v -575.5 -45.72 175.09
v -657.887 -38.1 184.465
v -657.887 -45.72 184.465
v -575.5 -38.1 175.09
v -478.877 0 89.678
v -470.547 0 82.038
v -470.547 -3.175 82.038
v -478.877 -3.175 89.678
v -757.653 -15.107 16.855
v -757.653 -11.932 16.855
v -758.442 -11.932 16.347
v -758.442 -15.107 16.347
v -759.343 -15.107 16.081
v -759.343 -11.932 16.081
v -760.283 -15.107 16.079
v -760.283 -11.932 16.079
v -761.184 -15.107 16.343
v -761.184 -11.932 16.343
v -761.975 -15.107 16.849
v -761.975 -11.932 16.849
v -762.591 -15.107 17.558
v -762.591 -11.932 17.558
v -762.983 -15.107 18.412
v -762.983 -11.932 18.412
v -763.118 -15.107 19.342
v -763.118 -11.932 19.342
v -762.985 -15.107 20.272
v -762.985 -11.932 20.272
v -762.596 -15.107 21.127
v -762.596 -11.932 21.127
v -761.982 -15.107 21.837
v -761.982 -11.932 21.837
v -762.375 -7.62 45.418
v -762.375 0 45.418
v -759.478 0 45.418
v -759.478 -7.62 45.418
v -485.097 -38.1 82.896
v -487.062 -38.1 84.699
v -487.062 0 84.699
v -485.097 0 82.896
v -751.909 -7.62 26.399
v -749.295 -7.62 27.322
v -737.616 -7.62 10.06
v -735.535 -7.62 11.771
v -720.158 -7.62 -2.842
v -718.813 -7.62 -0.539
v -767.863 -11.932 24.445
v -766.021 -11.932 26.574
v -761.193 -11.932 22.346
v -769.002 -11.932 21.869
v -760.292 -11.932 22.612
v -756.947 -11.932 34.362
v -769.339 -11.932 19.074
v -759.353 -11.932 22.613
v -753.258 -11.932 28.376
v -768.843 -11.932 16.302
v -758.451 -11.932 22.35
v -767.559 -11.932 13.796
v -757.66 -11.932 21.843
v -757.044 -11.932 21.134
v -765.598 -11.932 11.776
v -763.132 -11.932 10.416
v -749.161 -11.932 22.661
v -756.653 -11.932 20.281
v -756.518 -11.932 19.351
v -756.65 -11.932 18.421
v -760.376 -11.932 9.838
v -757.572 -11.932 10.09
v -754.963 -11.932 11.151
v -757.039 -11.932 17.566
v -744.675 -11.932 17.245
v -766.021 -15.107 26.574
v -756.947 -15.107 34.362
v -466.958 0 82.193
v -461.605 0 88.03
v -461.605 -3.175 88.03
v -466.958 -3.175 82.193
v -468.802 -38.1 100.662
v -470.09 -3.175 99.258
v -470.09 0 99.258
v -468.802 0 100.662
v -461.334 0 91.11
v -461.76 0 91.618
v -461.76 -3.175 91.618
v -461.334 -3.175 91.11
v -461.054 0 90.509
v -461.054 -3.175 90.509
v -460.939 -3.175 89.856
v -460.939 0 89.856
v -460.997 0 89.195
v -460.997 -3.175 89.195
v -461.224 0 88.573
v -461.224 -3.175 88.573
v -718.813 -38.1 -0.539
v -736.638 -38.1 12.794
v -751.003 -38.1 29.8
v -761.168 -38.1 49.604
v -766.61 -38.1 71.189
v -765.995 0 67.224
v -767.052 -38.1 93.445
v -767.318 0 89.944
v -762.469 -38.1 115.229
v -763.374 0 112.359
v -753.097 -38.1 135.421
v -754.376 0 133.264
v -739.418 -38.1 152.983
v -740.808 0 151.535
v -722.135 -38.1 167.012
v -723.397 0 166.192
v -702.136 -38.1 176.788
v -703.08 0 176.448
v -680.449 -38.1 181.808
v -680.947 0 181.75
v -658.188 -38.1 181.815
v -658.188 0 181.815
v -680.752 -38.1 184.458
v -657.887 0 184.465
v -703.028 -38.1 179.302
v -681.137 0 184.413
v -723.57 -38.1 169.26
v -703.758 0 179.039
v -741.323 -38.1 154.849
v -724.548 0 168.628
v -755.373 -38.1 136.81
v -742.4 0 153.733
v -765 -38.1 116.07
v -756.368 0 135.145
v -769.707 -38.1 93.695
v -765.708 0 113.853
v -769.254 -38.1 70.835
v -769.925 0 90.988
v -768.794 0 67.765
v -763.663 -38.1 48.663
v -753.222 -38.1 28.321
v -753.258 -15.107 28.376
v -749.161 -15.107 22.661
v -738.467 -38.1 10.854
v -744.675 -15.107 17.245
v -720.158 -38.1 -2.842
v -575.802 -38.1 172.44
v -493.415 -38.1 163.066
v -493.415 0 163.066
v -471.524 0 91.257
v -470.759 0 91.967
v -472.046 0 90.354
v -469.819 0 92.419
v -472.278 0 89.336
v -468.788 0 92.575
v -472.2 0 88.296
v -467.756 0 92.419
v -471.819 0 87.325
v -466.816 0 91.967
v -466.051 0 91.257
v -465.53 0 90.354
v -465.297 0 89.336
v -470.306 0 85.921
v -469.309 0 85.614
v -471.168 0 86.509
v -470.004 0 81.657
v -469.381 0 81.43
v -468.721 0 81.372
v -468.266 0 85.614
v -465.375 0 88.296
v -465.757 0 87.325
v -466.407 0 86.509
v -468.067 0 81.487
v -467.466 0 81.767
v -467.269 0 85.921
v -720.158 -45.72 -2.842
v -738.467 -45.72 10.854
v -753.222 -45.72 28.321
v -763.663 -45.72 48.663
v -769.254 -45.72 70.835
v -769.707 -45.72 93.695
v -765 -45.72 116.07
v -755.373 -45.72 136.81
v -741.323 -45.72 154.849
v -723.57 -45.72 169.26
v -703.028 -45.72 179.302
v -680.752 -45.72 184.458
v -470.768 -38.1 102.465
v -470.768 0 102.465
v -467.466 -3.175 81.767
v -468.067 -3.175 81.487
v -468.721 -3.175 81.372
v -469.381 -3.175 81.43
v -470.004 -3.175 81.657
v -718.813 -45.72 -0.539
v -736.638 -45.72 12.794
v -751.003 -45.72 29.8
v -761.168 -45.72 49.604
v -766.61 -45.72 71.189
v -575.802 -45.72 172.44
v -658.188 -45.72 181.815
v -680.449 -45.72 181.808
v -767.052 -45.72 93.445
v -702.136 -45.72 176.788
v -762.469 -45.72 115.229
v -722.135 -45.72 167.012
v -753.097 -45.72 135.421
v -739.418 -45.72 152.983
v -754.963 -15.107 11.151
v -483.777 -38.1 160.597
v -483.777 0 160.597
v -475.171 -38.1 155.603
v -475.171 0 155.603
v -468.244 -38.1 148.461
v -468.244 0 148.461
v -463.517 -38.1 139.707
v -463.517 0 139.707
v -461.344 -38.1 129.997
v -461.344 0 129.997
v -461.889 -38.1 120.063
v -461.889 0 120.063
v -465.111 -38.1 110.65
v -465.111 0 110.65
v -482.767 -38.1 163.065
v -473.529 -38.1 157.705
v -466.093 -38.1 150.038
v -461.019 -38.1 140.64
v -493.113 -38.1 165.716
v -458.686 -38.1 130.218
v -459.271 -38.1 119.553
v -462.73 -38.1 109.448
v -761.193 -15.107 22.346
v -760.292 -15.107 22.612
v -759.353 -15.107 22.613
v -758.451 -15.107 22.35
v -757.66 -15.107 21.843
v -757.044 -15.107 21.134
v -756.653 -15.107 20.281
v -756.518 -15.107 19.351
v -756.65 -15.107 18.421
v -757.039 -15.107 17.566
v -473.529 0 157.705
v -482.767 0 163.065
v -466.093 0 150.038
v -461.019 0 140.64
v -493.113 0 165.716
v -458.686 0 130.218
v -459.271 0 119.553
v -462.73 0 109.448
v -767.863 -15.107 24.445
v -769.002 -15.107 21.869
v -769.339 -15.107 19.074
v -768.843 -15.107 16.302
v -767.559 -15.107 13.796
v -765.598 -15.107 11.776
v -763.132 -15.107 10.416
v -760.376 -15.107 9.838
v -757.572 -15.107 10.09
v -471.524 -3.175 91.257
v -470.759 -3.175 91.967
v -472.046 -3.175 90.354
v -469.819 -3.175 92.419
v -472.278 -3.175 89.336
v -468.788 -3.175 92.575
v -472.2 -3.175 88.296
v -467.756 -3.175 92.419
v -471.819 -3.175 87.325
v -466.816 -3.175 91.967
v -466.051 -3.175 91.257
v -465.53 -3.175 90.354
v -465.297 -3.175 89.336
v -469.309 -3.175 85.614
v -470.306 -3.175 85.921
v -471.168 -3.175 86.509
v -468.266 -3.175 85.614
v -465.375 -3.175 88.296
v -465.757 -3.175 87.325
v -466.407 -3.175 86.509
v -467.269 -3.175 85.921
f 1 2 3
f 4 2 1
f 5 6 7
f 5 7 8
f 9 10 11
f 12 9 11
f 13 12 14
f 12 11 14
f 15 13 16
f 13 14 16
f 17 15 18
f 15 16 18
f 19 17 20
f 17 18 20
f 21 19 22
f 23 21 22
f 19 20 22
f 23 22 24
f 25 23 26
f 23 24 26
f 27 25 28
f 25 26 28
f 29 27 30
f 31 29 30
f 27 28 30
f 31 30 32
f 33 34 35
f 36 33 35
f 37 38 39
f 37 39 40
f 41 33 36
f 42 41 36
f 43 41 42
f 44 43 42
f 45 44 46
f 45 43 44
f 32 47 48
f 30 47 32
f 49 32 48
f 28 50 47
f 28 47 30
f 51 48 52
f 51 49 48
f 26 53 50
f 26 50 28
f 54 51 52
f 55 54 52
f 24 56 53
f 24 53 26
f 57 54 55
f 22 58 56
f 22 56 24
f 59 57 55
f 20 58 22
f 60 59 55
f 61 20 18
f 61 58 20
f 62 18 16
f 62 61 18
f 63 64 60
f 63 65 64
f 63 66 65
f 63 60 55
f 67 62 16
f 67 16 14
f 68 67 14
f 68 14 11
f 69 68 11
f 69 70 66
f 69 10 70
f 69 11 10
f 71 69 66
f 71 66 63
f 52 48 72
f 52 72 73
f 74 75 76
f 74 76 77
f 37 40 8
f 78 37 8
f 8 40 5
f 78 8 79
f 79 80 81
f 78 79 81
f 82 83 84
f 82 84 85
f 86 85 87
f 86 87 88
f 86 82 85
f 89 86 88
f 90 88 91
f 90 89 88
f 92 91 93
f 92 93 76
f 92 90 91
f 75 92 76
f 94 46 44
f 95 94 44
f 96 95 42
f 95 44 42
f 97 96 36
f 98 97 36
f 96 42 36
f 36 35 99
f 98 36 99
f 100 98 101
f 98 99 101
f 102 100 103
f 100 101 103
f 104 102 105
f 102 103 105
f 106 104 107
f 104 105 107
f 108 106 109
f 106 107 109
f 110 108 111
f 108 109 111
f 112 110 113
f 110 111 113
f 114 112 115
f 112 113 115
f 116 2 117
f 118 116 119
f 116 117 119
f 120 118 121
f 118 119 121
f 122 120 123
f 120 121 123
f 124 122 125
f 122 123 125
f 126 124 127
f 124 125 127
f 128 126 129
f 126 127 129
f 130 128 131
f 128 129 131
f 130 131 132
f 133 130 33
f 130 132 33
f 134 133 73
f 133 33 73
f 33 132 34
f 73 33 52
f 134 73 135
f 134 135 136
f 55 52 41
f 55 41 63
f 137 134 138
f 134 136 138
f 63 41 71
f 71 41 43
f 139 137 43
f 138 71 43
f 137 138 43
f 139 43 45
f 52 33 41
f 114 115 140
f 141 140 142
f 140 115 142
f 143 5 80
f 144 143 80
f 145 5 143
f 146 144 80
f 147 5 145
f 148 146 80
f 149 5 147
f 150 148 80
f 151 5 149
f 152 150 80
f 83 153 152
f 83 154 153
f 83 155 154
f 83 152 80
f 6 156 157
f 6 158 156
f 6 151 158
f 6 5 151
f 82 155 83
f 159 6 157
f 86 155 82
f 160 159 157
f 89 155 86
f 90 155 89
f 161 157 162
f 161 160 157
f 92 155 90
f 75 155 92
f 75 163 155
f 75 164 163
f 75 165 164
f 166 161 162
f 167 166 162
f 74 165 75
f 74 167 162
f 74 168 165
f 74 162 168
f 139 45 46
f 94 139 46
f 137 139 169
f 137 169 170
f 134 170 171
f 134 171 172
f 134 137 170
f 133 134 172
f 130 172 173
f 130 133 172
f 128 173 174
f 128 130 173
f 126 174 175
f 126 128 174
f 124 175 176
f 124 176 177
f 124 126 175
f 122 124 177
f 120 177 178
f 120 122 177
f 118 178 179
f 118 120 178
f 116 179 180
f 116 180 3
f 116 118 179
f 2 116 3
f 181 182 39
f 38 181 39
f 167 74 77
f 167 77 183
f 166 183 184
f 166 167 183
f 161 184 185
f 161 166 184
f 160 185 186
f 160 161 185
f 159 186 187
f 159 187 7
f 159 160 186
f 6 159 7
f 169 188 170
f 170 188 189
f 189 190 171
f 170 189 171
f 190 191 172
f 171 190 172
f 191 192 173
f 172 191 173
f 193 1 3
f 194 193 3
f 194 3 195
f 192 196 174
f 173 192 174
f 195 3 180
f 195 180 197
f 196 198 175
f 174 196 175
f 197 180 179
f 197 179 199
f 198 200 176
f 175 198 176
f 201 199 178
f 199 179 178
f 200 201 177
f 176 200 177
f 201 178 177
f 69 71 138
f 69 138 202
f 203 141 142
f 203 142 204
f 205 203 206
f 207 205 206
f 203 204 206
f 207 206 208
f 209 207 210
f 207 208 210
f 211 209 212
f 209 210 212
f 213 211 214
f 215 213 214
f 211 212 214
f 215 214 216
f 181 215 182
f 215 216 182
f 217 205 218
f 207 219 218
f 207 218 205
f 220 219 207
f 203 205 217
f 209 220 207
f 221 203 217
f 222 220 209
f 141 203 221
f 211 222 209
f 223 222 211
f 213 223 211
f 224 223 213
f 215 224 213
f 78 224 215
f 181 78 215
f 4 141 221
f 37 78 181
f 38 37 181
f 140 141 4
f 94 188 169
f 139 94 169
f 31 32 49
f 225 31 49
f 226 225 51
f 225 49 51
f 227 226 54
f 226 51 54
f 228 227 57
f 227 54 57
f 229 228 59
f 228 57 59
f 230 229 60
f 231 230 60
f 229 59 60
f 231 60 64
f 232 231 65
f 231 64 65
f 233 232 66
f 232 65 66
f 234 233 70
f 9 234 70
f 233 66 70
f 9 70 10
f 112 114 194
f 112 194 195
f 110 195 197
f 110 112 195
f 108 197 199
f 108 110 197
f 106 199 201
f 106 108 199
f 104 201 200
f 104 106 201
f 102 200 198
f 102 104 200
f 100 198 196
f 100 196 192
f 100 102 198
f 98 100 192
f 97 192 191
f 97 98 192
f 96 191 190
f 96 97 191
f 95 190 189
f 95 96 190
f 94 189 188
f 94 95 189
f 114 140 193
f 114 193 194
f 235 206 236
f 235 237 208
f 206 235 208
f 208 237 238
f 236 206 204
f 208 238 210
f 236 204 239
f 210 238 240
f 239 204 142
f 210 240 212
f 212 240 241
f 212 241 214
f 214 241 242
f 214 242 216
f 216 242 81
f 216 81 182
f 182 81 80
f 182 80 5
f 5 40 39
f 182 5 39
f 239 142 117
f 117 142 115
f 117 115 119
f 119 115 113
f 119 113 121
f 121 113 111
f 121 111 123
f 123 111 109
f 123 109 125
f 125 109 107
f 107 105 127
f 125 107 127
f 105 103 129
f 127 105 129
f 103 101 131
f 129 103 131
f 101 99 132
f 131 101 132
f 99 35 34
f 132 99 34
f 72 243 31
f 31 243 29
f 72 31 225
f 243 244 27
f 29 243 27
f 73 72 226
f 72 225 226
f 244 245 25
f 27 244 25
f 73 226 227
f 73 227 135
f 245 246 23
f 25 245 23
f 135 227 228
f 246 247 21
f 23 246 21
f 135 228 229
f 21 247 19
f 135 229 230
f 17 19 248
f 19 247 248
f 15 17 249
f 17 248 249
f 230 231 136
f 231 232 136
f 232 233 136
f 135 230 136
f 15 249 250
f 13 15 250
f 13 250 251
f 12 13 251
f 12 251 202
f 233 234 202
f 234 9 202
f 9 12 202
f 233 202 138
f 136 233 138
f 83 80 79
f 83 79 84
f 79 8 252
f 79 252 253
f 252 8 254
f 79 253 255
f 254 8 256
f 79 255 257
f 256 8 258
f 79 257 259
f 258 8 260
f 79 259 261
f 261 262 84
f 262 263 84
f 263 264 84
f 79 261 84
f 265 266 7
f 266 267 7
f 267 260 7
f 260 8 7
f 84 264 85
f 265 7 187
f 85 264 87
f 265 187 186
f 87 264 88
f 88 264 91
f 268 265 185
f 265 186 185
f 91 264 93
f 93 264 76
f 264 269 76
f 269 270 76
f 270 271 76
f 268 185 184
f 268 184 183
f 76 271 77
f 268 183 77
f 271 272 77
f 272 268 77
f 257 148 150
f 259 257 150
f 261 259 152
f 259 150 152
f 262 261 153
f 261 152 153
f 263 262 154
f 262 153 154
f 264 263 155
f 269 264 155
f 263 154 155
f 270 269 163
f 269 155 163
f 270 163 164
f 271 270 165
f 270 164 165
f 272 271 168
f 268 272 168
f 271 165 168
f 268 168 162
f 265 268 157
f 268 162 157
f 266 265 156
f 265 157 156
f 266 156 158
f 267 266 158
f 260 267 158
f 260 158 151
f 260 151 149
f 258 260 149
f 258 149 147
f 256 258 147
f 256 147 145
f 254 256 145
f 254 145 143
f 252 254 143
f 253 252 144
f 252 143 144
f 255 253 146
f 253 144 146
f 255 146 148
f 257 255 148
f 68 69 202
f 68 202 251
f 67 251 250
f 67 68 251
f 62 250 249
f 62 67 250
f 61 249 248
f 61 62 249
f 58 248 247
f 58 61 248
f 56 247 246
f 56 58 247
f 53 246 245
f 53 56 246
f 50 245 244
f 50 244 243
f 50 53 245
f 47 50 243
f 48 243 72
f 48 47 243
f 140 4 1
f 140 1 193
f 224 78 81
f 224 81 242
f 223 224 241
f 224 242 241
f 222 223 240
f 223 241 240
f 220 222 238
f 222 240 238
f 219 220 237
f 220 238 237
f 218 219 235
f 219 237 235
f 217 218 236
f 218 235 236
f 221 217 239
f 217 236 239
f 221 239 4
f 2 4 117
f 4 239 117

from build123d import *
from build123d.topology import SkipClean

# Parameters (mm, degrees)
BASE_FLANGE1_DEPTH  = 38.1
CUT_EXTRUDE1_DEPTH  = 7.62
BOSS_EXTRUDE1_DEPTH = 3.175
BOSS_EXTRUDE2_DEPTH = 7.62
SKETCH11_R          = 3.5
BOSS_EXTRUDE3_DEPTH = 3.175


# Sheet-metal steps are written as plain solids
with BuildPart() as part:
    # Sketch1 → Base-Flange1 (new body)
    with BuildSketch(Plane(origin=(0, 0, 0), x_dir=(1, 0, 0), z_dir=(0, 1, 0))):
        with BuildLine():
            Line((-658.18839, -181.815019342), (-493.414651072, -163.065661223))
            ThreePointArc((-493.414651072, -163.065661223), (-463.516823985, -139.706651468), (-470.767754496, -102.464908652))
            Line((-470.767754496, -102.464908652), (-487.062469778, -84.698684743))
            Line((-487.062469778, -84.698684743), (-485.096976273, -82.895985576))
            Line((-485.096976273, -82.895985576), (-468.802260992, -100.662209486))
            ThreePointArc((-468.802260992, -100.662209486), (-461.018573288, -140.640264051), (-493.113122906, -165.715561177))
            Line((-493.113122906, -165.715561177), (-657.886861835, -184.464919296))
            ThreePointArc((-657.886861835, -184.464919296), (-764.999542035, -116.070482162), (-720.157705771, 2.841817501))
            Line((-720.157705771, 2.841817501), (-718.812633408, 0.538847823))
            ThreePointArc((-718.812633408, 0.538847823), (-762.468736724, -115.229106217), (-658.18839, -181.815019342))
        make_face()
    extrude(amount=-BASE_FLANGE1_DEPTH)

    # Sketch7 → Cut-Extrude1 (cut)
    with BuildSketch(Plane(origin=(-720.157705771, 0, -2.841817501), x_dir=(1, 0, 0), z_dir=(0, 1, 0))):
        with BuildLine():
            Line((1.345072363, -2.302969678), (0, 0))
            ThreePointArc((0, 0), (-25.04555192, -20.685894616), (-42.216883241, -48.26))
            Line((-42.216883241, -48.26), (-39.320240627, -48.26))
            ThreePointArc((-39.320240627, -48.26), (-22.669860727, -22.023203588), (1.345072363, -2.302969678))
        make_face()
    extrude(amount=-CUT_EXTRUDE1_DEPTH, mode=Mode.SUBTRACT)

    # Sketch9 → Boss-Extrude1 (add)
    with BuildSketch(Plane(origin=(0, -11.93175668, 0), x_dir=(1, 0, 0), z_dir=(0, 1, 0))):
        with BuildLine():
            Line((-766.021160844, -26.574153948), (-756.947378036, -34.362103973))
            ThreePointArc((-756.947378036, -34.362103973), (-751.259248381, -25.482371354), (-744.675064761, -17.245078325))
            Line((-744.675064761, -17.245078325), (-754.96335975, -11.151090609))
            ThreePointArc((-754.96335975, -11.151090609), (-767.558577165, -13.796318349), (-766.021160844, -26.574153948))
        make_face()
        with BuildLine():
            ThreePointArc((-761.982172567, -21.837237166), (-757.32668993, -21.510922268), (-757.653004828, -16.85543963))
            ThreePointArc((-757.653004828, -16.85543963), (-762.308487465, -17.181754528), (-761.982172567, -21.837237166))
        make_face(mode=Mode.SUBTRACT)
    extrude(amount=-BOSS_EXTRUDE1_DEPTH)

    # Sketch10 → Boss-Extrude2 (add)
    with SkipClean():  # the faces are left unmerged after this step: merging them gives an invalid solid
        with BuildSketch(Plane.XZ.offset(38.1)):
            with BuildLine():
                Line((-718.812633408, -0.538847823), (-720.157705771, -2.841817501))
                ThreePointArc((-720.157705771, -2.841817501), (-764.999542035, 116.070482162), (-657.886861835, 184.464919296))
                Line((-657.886861835, 184.464919296), (-575.49999237, 175.090240236))
                Line((-575.49999237, 175.090240236), (-575.801520536, 172.440340282))
                Line((-575.801520536, 172.440340282), (-658.18839, 181.815019342))
                ThreePointArc((-658.18839, 181.815019342), (-762.468736724, 115.229106217), (-718.812633408, -0.538847823))
            make_face()
        extrude(amount=BOSS_EXTRUDE2_DEPTH)

    # Sketch11 → Boss-Extrude3 (add)
    with SkipClean():  # the faces are left unmerged after this step: merging them gives an invalid solid
        with BuildSketch(Plane(origin=(0, 0, 0), x_dir=(1, 0, 0), z_dir=(0, 1, 0))):
            with BuildLine():
                Line((-470.547014649, -82.037691541), (-478.876963309, -89.677702295))
                Line((-478.876963309, -89.677702295), (-470.089903254, -99.258285554))
                Line((-470.089903254, -99.258285554), (-461.759954594, -91.618274801))
                ThreePointArc((-461.759954594, -91.618274801), (-460.939178, -89.856007635), (-461.604912368, -88.029519876))
                Line((-461.604912368, -88.029519876), (-466.958259724, -82.192733767))
                ThreePointArc((-466.958259724, -82.192733767), (-468.72052689, -81.371957173), (-470.547014649, -82.037691541))
            make_face()
            with Locations(Location((-468.787614295, -89.074866795, 0), (0, 0, 270))):
                Circle(SKETCH11_R, mode=Mode.SUBTRACT)
        extrude(amount=-BOSS_EXTRUDE3_DEPTH)


solid = part.part
